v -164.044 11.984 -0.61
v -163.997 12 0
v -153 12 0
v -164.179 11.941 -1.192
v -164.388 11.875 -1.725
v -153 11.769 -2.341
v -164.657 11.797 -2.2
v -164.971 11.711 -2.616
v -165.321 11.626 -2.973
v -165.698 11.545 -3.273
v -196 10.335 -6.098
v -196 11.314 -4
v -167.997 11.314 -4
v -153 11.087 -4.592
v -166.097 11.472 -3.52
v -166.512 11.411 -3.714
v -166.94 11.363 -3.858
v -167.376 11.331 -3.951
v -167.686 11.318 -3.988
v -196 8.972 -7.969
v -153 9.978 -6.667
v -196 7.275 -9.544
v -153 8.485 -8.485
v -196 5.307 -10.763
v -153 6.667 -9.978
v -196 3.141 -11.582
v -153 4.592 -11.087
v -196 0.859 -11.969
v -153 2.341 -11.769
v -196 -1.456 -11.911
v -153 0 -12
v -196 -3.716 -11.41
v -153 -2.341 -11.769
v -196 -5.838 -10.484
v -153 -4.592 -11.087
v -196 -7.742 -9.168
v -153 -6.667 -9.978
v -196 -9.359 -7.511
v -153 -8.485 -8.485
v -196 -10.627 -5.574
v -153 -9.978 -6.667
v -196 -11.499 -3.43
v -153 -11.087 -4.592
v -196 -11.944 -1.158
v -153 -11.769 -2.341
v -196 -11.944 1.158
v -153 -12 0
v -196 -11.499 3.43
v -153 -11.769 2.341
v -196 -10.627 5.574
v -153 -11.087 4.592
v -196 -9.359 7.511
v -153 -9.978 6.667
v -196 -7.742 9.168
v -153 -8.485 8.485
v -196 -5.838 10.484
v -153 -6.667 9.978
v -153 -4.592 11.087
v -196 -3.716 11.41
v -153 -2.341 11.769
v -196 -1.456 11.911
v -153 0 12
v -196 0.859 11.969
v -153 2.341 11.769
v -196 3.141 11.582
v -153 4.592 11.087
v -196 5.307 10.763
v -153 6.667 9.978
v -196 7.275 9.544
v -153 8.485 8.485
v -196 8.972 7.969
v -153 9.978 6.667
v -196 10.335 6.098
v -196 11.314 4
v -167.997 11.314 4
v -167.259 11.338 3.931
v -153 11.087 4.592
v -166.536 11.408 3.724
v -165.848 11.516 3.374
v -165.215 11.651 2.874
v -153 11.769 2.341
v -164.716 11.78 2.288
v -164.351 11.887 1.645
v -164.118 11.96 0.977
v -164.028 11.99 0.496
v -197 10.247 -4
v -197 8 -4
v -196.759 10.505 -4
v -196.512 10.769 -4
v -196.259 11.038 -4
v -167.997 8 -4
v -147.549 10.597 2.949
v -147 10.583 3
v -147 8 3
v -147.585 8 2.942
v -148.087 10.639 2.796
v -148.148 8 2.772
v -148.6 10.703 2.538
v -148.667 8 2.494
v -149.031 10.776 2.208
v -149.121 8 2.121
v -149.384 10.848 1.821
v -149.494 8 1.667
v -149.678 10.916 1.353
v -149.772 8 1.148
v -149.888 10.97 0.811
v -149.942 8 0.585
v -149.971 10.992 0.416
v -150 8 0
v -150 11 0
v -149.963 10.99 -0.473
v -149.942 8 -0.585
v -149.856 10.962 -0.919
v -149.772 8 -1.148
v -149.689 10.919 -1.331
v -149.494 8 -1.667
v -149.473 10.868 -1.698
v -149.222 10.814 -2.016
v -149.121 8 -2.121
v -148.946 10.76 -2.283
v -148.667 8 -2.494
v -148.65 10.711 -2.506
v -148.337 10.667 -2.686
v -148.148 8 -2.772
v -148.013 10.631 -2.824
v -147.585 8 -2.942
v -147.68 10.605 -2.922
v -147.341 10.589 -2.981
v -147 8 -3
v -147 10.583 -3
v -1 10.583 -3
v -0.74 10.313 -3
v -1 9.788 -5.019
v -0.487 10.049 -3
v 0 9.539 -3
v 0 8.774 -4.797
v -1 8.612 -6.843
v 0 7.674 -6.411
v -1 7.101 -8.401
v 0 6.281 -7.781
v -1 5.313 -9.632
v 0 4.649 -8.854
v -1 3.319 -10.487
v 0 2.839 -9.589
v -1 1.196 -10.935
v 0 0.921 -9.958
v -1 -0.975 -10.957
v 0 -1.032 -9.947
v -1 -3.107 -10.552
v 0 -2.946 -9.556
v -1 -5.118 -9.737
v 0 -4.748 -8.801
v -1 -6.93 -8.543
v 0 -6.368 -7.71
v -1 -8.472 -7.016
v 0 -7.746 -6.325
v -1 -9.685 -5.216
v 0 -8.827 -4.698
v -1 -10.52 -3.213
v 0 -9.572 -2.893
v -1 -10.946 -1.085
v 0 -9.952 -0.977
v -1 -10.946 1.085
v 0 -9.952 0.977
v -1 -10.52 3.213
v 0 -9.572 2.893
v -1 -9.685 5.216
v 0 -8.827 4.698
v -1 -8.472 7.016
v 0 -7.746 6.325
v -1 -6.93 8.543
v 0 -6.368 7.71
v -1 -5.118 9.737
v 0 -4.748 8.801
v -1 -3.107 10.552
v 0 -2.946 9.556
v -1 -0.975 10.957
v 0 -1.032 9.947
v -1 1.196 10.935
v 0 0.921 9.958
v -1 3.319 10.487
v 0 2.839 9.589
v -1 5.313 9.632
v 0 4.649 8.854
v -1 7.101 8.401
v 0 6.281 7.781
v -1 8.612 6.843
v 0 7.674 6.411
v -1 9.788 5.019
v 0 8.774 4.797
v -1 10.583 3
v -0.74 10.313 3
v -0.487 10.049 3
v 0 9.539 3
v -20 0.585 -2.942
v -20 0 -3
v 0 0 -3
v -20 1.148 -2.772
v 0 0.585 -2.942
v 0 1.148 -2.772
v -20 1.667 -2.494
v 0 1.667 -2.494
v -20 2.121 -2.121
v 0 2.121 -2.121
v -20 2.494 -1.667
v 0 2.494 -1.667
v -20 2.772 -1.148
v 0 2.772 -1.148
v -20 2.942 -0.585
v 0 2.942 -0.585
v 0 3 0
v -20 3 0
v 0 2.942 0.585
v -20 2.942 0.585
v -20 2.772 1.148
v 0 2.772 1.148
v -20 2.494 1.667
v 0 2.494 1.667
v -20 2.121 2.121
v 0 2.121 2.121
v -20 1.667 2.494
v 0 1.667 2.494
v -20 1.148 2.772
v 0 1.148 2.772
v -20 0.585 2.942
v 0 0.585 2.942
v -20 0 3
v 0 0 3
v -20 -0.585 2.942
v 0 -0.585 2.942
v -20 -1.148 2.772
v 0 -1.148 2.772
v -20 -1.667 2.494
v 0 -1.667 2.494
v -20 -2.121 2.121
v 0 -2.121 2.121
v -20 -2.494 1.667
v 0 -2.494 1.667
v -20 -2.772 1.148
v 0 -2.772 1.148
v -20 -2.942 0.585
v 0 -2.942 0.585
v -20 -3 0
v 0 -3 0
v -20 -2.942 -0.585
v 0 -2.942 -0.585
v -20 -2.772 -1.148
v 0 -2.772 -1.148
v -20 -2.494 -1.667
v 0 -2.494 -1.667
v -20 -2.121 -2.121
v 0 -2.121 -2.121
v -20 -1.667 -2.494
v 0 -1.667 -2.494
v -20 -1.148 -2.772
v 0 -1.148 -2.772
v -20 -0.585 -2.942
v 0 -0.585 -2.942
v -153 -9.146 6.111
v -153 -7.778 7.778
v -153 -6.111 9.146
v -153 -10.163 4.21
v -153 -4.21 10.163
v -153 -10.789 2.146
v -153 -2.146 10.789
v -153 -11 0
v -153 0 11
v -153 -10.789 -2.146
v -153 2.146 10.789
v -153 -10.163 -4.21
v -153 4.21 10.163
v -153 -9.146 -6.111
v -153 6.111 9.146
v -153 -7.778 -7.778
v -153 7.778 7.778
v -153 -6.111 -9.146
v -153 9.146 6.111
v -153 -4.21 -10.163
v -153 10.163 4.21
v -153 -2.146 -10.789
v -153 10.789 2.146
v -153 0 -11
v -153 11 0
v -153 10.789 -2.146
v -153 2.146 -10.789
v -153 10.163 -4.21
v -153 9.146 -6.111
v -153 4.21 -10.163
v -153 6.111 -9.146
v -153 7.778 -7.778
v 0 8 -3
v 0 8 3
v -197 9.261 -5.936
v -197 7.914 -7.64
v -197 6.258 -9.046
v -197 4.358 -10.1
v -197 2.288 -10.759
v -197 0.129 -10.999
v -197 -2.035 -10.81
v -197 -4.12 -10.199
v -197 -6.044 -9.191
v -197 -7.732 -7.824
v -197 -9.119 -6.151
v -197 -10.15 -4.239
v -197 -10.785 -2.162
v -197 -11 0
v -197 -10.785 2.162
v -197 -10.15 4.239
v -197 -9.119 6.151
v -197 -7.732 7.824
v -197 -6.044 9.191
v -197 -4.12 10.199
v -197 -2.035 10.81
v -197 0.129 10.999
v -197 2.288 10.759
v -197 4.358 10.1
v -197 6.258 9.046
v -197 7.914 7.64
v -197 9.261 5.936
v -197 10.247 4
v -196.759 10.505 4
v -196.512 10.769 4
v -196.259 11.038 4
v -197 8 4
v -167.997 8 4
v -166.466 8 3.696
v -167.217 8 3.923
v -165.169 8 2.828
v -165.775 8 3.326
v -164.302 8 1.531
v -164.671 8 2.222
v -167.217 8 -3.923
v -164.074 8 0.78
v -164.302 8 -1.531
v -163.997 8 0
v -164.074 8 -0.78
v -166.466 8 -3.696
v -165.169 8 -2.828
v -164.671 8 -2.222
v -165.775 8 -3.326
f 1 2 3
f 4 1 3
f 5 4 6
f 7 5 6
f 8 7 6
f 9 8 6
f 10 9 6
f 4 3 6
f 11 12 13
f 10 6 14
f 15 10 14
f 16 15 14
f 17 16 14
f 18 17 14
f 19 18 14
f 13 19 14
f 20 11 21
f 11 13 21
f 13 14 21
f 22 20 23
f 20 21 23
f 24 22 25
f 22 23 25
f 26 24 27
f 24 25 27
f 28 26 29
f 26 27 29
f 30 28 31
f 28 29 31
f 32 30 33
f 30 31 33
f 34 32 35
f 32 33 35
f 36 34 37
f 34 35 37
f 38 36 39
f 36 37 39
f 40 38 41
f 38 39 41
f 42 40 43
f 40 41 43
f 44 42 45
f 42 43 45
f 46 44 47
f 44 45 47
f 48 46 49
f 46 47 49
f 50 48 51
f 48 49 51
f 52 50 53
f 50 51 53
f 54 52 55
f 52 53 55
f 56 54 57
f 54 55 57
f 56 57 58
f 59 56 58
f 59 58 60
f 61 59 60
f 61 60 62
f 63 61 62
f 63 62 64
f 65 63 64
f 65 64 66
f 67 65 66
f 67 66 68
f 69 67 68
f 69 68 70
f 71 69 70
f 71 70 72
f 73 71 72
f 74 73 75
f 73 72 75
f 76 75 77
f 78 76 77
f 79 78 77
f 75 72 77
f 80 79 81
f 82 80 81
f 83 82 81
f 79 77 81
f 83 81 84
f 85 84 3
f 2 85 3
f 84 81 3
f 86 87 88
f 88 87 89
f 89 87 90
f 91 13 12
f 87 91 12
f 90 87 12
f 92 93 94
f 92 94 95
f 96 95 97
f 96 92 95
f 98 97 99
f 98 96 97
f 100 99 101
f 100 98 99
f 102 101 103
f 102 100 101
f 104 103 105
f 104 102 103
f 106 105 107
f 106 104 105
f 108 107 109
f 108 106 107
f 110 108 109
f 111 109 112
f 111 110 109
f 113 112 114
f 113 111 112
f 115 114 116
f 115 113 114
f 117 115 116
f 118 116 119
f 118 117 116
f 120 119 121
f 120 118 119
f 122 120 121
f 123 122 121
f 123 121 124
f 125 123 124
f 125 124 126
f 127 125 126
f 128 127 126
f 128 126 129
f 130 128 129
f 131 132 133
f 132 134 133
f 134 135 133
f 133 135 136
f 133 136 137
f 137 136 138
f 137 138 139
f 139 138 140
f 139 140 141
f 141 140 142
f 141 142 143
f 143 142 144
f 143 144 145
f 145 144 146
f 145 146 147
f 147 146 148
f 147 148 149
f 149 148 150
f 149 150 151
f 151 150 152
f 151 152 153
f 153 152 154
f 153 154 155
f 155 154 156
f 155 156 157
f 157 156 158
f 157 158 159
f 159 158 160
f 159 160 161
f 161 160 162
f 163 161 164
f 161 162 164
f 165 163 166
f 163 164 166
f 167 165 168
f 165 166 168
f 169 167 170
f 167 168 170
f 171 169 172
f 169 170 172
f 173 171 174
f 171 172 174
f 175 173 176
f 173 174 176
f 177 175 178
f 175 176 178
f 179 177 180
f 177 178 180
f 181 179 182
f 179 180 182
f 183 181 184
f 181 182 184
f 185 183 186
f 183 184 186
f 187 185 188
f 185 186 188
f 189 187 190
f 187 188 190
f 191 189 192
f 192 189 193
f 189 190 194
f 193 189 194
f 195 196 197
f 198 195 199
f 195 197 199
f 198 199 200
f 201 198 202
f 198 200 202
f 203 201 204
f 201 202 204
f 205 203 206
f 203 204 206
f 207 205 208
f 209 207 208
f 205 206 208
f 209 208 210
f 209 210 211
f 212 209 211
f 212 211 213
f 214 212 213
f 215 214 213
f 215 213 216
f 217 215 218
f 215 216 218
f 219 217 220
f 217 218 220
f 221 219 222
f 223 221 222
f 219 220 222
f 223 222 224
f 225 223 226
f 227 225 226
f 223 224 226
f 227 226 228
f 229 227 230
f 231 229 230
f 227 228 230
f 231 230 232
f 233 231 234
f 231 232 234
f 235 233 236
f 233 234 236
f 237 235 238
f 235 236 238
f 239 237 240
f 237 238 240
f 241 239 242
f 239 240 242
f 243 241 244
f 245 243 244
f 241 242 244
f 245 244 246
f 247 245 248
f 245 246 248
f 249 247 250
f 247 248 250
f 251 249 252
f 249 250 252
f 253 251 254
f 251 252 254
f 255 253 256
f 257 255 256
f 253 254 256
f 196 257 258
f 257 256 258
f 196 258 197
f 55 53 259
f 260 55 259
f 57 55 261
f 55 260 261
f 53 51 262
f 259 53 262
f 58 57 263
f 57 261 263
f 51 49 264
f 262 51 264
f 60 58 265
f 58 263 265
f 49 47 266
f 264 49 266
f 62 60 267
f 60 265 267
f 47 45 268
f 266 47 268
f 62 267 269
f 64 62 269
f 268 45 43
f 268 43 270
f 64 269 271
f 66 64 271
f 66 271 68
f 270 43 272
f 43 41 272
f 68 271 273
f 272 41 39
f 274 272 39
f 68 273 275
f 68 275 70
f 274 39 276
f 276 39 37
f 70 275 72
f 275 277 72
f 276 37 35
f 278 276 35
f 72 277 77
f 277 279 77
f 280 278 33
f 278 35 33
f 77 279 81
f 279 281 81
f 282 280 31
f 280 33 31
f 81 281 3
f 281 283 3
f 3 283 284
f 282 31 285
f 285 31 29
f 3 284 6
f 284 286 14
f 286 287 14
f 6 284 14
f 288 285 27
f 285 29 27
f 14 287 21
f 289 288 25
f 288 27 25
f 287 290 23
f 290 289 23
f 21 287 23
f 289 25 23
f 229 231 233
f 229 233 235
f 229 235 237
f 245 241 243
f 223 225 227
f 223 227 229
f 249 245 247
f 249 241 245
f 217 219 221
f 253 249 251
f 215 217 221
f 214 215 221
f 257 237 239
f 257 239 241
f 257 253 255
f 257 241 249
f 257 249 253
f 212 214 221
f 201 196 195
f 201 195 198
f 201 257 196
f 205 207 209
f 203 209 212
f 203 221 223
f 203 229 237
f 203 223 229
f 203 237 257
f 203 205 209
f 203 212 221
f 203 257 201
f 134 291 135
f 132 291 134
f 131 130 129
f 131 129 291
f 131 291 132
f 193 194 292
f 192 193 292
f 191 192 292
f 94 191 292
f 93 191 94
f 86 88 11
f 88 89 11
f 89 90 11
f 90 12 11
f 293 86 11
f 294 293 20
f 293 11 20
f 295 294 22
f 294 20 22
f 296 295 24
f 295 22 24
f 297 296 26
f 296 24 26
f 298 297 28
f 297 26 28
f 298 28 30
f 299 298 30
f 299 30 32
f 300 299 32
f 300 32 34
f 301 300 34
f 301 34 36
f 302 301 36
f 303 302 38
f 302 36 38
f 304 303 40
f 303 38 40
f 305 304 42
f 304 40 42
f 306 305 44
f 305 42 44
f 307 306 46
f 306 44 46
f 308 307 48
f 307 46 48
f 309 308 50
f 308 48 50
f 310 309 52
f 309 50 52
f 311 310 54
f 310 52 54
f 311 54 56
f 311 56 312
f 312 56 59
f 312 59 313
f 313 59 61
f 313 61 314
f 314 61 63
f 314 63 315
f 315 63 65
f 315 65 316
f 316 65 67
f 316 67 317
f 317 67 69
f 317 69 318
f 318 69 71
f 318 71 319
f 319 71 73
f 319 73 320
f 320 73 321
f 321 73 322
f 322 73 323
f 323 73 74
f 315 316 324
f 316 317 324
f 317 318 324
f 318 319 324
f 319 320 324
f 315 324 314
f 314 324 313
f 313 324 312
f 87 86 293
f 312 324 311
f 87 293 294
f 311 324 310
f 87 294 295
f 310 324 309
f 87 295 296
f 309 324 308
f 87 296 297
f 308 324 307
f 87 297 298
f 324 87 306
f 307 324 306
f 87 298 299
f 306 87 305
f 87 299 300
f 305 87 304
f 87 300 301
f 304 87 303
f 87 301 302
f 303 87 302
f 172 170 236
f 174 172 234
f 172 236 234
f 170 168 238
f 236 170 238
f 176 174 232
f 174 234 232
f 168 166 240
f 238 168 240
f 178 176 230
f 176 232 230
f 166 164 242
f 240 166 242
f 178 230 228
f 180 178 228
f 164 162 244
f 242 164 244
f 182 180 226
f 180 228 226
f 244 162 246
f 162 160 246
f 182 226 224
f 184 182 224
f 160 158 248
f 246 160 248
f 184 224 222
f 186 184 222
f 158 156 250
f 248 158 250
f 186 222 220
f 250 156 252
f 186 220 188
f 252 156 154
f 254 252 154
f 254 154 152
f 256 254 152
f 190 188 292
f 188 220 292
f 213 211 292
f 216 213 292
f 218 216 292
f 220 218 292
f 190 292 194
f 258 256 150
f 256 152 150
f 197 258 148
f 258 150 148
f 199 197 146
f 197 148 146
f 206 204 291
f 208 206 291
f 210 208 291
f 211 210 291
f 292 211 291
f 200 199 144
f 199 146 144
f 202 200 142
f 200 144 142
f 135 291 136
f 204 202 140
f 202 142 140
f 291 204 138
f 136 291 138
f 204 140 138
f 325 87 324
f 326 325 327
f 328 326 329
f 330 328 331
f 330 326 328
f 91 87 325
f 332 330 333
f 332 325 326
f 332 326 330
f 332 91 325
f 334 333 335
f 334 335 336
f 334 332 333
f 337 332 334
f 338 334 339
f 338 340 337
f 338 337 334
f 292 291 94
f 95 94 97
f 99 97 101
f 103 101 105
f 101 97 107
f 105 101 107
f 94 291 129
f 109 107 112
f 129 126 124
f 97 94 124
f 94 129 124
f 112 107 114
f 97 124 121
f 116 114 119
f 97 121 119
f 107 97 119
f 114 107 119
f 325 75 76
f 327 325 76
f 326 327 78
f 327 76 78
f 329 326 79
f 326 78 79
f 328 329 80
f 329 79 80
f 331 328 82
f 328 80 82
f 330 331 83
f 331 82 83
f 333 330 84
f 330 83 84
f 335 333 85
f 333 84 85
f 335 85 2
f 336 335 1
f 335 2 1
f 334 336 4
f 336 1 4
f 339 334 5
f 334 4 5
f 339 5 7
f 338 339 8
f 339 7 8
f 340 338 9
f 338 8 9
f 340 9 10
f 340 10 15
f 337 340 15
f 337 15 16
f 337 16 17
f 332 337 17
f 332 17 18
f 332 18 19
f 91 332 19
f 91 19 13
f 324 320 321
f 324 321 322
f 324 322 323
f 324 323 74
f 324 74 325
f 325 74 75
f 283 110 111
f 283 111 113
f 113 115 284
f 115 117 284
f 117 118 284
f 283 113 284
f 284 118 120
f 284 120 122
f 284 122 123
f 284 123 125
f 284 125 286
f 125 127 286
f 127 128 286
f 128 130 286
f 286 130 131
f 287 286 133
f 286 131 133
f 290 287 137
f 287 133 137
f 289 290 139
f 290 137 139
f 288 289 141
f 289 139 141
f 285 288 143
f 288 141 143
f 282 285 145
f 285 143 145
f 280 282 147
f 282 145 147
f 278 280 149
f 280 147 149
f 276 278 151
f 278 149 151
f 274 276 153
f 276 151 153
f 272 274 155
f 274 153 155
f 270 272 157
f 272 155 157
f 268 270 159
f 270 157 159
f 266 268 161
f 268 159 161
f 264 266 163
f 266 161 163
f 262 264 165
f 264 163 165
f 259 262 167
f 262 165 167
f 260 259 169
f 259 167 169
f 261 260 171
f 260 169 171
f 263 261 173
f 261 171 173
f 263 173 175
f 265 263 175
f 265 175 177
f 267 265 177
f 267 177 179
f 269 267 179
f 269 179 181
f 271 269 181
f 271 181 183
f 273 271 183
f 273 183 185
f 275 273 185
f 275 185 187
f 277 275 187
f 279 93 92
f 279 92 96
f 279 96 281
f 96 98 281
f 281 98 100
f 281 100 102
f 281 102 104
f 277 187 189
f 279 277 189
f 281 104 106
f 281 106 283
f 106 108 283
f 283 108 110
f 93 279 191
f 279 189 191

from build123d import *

# Parameters (mm, degrees)
CUT_EXTRUDE1_DEPTH = 4
CUT_EXTRUDE2_DEPTH = 3
CHAMFER1_SIZE      = 1
SKETCH4_R          = 3
CUT_EXTRUDE3_DEPTH = 20


with BuildPart() as part:
    # Sketch1 → Revolve1 (revolve)
    with BuildSketch(Plane.XY):
        Polygon((0, 0), (-197, 0), (-197, 12), (-153, 12), (-153, 11), (0, 11), align=None)
    revolve(axis=Axis((0, 0, 0), (-1, 0, 0)))

    # Sketch2 → Cut-Extrude1 (cut)
    with BuildSketch(Plane(origin=(0, 12, 0), x_dir=(1, 0, 0), z_dir=(0, 1, 0))):
        with BuildLine():
            Line((-167.997220054, 4), (-197, 4))
            Line((-197, 4), (-197, -4))
            Line((-197, -4), (-167.997221426, -4))
            ThreePointArc((-167.997221426, -4), (-163.997220054, -6.86e-07), (-167.997220054, 4))
        make_face()
    extrude(amount=-CUT_EXTRUDE1_DEPTH, mode=Mode.SUBTRACT)

    # Sketch3 → Cut-Extrude2 (cut)
    with BuildSketch(Plane(origin=(0, 11, 0), x_dir=(1, 0, 0), z_dir=(0, 1, 0))):
        with BuildLine():
            Line((-147, 3), (0, 3))
            Line((0, 3), (0, -3))
            Line((0, -3), (-147, -3))
            ThreePointArc((-147, -3), (-150, 0), (-147, 3))
        make_face()
    extrude(amount=-CUT_EXTRUDE2_DEPTH, mode=Mode.SUBTRACT)

    # Chamfer1
    chamfer1_edges = [part.edges().sort_by_distance(p)[0] for p in [
        (-197, -12, 0),
        (0, -11, 0),
    ]]
    chamfer(chamfer1_edges, length=CHAMFER1_SIZE)

    # Sketch4 → Cut-Extrude3 (cut)
    with BuildSketch(Plane(origin=(0, 0, 0), x_dir=(0, 0, -1), z_dir=(1, 0, 0))):
        Circle(SKETCH4_R)
    extrude(amount=-CUT_EXTRUDE3_DEPTH, mode=Mode.SUBTRACT)


solid = part.part
